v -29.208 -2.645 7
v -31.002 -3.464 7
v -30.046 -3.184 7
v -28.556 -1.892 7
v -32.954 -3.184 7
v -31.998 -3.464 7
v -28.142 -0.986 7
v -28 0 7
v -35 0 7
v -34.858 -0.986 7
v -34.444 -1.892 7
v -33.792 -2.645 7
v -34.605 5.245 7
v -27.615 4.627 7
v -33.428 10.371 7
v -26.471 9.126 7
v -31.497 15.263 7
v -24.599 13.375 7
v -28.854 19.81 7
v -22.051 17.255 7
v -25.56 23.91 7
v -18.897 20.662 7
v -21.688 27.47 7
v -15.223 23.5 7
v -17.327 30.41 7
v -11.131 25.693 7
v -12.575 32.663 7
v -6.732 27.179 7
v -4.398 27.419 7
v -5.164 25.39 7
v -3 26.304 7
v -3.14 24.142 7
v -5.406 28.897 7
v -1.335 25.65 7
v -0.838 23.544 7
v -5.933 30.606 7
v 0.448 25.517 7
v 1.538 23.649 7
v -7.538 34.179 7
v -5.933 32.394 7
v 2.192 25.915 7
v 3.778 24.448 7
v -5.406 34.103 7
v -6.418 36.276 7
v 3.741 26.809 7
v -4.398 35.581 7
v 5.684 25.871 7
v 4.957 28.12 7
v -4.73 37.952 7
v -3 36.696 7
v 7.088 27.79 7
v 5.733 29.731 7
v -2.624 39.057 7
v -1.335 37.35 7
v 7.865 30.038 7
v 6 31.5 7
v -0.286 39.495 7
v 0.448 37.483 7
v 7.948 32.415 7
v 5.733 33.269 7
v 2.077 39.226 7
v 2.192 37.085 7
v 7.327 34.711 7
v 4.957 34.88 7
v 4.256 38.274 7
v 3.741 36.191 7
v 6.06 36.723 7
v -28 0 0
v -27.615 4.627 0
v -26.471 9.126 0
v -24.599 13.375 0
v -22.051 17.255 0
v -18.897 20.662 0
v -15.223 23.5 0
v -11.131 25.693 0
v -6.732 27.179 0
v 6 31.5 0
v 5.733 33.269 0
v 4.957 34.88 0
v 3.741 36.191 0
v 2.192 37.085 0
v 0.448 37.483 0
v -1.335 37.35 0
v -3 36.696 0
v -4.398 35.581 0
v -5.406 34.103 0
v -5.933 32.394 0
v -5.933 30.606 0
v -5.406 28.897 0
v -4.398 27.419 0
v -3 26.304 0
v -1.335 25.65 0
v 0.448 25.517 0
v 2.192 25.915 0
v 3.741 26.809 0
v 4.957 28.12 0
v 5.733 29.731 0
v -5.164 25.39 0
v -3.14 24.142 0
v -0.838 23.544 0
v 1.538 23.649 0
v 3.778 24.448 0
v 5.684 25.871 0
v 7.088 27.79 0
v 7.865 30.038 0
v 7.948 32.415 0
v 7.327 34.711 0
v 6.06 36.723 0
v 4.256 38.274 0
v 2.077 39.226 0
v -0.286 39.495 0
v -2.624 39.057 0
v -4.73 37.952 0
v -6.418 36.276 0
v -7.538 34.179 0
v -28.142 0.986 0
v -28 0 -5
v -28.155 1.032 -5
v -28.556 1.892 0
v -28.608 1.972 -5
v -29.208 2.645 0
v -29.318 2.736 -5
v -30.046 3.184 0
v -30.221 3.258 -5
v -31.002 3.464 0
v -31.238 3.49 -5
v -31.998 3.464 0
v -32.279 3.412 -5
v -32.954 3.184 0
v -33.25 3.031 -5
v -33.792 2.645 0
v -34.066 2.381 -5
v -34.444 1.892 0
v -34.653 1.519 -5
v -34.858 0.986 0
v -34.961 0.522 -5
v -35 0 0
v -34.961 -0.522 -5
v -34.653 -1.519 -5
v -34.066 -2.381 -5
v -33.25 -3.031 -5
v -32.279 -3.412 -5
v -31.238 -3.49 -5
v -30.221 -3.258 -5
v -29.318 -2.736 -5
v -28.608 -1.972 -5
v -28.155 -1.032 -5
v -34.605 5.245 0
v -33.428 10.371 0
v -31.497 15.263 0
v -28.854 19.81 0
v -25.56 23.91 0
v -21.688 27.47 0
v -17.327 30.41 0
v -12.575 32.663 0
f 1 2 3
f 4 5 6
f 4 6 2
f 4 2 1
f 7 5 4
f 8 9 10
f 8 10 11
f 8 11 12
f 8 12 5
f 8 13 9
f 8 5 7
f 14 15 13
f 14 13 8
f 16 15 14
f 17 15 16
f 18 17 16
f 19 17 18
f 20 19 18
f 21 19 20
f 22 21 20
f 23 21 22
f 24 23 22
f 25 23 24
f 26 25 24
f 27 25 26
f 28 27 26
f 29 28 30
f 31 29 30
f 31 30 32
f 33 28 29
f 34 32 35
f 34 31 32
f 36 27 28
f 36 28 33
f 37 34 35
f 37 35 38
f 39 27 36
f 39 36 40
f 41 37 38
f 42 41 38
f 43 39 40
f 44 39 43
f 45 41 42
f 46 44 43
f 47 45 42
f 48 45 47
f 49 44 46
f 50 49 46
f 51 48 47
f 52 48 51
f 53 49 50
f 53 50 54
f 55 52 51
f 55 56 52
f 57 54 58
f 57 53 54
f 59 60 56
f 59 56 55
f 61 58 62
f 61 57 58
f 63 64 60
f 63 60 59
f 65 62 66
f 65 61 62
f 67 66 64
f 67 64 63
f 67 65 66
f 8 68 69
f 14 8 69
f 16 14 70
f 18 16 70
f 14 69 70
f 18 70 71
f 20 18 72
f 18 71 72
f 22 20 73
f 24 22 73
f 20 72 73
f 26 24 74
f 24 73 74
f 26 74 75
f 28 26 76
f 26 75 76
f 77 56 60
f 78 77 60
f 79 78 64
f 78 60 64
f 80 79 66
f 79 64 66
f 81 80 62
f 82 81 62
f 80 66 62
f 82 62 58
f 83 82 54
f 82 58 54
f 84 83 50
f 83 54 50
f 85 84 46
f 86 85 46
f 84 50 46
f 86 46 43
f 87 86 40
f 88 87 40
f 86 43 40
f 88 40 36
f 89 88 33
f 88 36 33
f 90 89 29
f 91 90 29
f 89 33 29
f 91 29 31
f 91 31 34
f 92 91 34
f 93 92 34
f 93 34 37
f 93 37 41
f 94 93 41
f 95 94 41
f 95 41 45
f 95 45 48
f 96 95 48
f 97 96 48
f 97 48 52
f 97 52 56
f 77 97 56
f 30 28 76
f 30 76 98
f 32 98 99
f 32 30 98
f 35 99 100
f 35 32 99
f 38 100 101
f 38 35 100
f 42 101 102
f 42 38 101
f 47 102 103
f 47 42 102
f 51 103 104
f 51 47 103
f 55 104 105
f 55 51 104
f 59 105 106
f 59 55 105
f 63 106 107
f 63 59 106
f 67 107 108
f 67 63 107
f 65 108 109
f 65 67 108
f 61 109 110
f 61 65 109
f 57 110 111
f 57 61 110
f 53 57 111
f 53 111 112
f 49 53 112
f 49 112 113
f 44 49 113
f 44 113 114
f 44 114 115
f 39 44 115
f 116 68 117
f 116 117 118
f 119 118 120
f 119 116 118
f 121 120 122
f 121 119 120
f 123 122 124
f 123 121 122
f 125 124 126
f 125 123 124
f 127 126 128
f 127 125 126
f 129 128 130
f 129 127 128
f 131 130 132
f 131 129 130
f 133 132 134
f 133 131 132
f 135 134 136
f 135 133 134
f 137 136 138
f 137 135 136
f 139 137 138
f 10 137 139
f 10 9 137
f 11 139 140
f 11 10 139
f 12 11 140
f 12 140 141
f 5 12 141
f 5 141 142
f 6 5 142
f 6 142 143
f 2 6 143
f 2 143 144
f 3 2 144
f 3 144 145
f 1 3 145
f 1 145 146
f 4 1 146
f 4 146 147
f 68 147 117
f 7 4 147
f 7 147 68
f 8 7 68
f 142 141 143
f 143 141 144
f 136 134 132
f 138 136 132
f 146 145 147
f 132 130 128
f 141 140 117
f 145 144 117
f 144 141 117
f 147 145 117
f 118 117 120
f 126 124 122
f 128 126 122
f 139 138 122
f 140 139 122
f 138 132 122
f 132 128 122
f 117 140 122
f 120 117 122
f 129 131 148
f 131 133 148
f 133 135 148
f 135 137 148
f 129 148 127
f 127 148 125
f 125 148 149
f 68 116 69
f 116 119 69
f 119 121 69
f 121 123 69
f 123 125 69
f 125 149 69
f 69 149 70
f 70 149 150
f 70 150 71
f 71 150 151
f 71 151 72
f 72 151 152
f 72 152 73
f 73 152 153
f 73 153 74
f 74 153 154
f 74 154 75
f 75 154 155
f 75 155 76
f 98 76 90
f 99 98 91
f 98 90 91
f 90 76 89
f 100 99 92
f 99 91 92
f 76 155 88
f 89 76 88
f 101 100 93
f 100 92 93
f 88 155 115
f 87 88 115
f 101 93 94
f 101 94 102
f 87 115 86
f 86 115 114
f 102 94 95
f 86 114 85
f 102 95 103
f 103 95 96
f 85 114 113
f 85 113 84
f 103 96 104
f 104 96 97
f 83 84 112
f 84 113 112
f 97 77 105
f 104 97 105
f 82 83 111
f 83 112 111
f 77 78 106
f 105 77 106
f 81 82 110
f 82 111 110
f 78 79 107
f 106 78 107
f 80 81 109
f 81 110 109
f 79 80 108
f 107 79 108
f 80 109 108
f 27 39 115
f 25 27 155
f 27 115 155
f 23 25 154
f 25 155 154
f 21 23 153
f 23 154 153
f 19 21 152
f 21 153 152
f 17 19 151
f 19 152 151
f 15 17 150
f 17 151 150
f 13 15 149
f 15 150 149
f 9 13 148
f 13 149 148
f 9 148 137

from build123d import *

# Parameters (mm, degrees)
F0_R     = 35
F2_DEPTH = 7
F3_DEPTH = 7.001
F4_R     = 8
F5_DEPTH = 7
F6_R     = 3.5
F7_DEPTH = 12
F8_R     = 6
F9_DEPTH = 12.001


with BuildPart() as f2:
    # F0 (on Top) → F2 (new body)
    with BuildSketch(Plane.XY):
        Circle(F0_R)
    extrude(amount=F2_DEPTH)

    # F1 (on face) → F3 (intersect, through all)
    with BuildSketch(Plane.XY):
        with BuildLine():
            Line((0, 28), (0, 35))
            ThreePointArc((0, 35), (-24.748737, 24.748737), (-35, 0))
            Line((-35, 0), (-28, 0))
            ThreePointArc((-28, 0), (-19.79899, 19.79899), (0, 28))
        make_face()
    extrude(amount=F3_DEPTH, mode=Mode.INTERSECT)

    # F4 (on face) → F5 (join)
    with BuildSketch(Plane.XY.offset(7)):
        with Locations((0, 31.5)):
            Circle(F4_R)
    extrude(amount=-F5_DEPTH)

    # F6 (on face) → F7 (join)
    with BuildSketch(Plane.XY.offset(7)):
        with Locations((-31.5, 0)):
            Circle(F6_R)
    extrude(amount=-F7_DEPTH)

    # F8 (on face) → F9 (cut, through all)
    with BuildSketch(Plane.XY.offset(7)):
        with Locations((0, 31.5)):
            Circle(F8_R)
    extrude(amount=-F9_DEPTH, mode=Mode.SUBTRACT)


solid = f2.part
